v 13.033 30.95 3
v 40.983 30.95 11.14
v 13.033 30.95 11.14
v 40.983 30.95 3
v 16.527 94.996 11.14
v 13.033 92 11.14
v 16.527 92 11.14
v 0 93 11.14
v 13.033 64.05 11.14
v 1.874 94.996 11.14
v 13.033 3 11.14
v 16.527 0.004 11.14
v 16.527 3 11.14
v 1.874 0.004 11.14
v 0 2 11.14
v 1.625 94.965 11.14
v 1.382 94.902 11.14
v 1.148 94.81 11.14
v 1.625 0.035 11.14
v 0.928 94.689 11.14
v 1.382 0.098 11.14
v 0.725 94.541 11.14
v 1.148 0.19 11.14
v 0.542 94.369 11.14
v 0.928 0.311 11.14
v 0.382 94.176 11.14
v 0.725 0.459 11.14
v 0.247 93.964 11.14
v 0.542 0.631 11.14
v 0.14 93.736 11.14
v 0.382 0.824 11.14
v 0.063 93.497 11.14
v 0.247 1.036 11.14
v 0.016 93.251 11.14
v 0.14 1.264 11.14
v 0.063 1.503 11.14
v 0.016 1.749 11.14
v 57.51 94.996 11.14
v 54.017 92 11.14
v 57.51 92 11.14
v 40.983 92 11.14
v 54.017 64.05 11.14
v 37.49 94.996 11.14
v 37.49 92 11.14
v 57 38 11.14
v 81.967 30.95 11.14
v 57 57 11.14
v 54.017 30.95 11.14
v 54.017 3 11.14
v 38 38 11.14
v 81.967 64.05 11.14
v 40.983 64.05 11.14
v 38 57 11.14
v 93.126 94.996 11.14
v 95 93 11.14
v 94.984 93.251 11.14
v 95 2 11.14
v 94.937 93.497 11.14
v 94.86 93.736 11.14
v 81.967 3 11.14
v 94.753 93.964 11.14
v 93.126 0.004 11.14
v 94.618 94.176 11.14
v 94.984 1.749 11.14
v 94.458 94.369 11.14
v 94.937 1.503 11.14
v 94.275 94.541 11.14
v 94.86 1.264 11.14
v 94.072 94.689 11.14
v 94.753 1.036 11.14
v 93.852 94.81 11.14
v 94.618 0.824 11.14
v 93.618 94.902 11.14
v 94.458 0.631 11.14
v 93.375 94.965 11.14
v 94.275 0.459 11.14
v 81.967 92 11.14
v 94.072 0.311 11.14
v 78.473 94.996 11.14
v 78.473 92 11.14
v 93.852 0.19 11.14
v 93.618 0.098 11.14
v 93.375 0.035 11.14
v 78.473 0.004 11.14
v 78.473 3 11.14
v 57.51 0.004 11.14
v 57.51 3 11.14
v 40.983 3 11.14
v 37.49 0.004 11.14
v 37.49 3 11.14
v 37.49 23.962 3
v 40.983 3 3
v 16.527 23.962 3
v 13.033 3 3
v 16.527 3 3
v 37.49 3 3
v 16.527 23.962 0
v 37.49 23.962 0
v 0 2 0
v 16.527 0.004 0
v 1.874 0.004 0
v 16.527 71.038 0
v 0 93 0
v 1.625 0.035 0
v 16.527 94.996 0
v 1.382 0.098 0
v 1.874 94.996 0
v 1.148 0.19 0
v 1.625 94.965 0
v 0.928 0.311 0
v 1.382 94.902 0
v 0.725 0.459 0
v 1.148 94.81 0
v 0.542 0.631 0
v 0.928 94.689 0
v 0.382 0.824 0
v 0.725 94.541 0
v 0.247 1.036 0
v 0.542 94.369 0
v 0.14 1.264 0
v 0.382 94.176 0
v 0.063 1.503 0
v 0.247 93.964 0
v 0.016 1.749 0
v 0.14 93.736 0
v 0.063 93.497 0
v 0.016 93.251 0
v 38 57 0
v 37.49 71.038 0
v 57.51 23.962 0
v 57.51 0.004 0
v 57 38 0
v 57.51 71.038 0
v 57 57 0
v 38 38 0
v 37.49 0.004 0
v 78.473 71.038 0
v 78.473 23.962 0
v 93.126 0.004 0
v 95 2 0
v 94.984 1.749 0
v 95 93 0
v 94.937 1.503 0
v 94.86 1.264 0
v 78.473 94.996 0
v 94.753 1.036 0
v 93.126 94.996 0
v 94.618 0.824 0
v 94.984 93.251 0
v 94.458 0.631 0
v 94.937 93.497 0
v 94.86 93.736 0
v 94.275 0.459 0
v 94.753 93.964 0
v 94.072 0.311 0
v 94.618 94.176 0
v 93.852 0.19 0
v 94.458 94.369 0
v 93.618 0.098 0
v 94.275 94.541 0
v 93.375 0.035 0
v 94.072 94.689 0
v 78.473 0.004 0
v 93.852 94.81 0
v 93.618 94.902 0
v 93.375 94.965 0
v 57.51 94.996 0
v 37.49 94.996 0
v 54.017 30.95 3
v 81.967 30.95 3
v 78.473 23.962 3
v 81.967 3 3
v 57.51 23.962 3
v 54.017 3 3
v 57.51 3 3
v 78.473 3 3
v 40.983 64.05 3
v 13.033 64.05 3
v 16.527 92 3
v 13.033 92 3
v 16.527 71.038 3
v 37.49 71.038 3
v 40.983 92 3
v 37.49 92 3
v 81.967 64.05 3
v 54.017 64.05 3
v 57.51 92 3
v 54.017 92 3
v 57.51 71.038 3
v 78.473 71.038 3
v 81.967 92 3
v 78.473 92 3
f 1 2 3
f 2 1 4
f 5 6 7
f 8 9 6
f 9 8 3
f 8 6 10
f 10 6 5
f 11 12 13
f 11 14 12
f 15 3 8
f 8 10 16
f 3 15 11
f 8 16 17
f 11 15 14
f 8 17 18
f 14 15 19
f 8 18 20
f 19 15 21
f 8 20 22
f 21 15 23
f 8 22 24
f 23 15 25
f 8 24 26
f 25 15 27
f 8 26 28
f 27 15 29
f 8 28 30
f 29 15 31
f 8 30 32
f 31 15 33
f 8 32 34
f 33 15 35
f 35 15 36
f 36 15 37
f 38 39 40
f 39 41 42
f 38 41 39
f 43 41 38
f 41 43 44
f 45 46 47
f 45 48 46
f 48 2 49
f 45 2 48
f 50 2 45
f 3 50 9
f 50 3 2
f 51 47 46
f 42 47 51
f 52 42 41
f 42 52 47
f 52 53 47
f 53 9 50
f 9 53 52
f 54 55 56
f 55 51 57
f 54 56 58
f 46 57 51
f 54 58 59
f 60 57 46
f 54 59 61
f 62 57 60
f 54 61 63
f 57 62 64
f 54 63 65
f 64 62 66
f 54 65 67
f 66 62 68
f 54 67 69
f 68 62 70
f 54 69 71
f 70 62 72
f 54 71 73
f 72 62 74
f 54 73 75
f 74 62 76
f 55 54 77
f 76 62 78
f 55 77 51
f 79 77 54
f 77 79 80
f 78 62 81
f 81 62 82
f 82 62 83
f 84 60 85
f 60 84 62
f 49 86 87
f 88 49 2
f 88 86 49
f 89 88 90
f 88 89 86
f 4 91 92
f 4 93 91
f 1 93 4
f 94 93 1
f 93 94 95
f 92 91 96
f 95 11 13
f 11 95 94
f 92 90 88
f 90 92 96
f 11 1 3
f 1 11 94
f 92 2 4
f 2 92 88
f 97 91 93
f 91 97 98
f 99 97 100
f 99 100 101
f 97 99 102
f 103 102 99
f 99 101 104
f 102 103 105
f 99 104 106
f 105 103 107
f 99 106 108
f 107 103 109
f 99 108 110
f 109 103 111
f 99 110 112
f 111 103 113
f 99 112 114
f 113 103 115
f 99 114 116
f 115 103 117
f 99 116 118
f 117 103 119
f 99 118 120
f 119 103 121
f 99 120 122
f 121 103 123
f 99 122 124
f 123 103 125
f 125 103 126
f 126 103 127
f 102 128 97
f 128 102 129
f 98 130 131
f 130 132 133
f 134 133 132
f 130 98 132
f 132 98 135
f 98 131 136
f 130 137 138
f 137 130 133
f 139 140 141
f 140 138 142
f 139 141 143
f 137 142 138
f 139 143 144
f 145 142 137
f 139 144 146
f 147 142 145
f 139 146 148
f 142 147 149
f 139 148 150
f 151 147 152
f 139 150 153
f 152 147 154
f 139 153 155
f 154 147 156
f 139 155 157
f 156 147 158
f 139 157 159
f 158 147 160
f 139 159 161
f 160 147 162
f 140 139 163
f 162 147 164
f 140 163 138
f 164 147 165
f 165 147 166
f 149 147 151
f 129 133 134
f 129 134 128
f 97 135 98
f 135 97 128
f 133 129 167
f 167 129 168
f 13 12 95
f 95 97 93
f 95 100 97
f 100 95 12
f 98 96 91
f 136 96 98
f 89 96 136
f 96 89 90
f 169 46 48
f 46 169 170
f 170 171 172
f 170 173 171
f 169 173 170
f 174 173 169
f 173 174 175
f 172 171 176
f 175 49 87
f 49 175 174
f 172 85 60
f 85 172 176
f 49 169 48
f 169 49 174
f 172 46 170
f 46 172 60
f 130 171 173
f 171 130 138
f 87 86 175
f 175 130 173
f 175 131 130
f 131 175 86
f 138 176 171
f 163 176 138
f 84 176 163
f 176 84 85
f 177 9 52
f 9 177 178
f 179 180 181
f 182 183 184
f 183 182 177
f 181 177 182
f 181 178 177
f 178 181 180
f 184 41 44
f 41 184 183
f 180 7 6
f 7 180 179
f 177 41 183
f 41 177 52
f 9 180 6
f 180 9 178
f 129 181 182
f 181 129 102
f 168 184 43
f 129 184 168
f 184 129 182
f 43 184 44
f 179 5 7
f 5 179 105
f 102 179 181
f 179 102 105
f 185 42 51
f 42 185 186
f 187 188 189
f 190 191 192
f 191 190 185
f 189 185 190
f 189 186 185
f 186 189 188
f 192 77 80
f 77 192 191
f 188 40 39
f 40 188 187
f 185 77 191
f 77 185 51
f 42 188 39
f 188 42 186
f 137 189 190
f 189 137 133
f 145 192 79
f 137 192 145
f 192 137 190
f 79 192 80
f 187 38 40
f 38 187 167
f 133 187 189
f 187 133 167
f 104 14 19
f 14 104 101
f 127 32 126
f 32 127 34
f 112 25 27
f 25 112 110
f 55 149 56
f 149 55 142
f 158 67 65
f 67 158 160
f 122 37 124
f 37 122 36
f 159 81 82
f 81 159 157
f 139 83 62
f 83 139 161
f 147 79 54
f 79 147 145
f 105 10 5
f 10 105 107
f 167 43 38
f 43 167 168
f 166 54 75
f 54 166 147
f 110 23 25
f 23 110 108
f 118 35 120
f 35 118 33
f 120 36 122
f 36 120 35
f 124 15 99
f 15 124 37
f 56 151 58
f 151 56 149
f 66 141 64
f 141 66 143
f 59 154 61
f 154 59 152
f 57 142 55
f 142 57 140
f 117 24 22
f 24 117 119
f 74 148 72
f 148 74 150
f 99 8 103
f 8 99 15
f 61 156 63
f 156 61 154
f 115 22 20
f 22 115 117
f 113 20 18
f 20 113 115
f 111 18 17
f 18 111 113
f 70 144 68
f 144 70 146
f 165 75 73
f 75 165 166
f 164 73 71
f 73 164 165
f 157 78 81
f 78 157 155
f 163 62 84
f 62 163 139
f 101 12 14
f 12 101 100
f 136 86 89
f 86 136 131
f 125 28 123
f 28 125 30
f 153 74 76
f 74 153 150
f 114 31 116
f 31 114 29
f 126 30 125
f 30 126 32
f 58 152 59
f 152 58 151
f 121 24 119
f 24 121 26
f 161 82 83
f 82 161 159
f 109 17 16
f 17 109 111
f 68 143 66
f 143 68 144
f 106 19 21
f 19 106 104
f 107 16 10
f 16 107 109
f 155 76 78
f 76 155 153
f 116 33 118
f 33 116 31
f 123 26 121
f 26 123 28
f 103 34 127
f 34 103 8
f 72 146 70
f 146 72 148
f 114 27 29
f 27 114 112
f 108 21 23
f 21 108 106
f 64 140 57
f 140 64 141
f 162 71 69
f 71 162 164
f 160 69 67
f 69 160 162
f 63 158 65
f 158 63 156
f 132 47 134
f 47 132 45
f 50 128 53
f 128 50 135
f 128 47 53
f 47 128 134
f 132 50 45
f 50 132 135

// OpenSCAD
// file: SquarePileLib.scad
module LeftPile(wallThickness, totalHeight, singlePileHeight, singlePileWidth, singlePileLength, pileCount, openingSizePercent = .75){
    pileHeight = (pileCount * singlePileHeight) + .5;
    lengthOpeningSize = singlePileLength * openingSizePercent;
    widthOpeningSize = singlePileWidth * openingSizePercent;
    blockerSize = (singlePileWidth - widthOpeningSize) / 2;
    
    translate([wallThickness, wallThickness, totalHeight - pileHeight])
        cube([singlePileLength, singlePileWidth, pileHeight]);
    translate([-.00001, wallThickness + (blockerSize), 0])
        cube([wallThickness + lengthOpeningSize, widthOpeningSize, totalHeight]);
}

module RightPile(wallThickness, totalHeight, singlePileHeight, singlePileWidth, singlePileLength, pileCount, openingSizePercent = .75){
    translate([0, wallThickness + wallThickness + singlePileWidth, 0])
        rotate([0, 0, 180])
            LeftPile(wallThickness, totalHeight, singlePileHeight, singlePileWidth, singlePileLength, pileCount, openingSizePercent);
}

module BottomPile(wallThickness, totalHeight, singlePileHeight, singlePileWidth, singlePileLength, pileCount, openingSizePercent = .75){
    translate([wallThickness + wallThickness + singlePileWidth, 0, 0])
        rotate([0, 0, 90])
            LeftPile(wallThickness, totalHeight, singlePileHeight, singlePileWidth, singlePileLength, pileCount, openingSizePercent);
}

module TopPile(wallThickness, totalHeight, singlePileHeight, singlePileWidth, singlePileLength, pileCount, openingSizePercent = .75){
        rotate([0, 0, 270])
            LeftPile(wallThickness, totalHeight, singlePileHeight, singlePileWidth, singlePileLength, pileCount, openingSizePercent);
}
// file: CoreLib.scad
function whiteSpaceBetweenBoxes(side, numberOfBoxes, boxLength) =
    (side - (numberOfBoxes * boxLength)) / (numberOfBoxes + 1);
    
function getOffsetForWhiteSpace(whiteSpaceBetweenBoxes, index, boxLength, singleBoxOffset) =
    ((index + 1) * whiteSpaceBetweenBoxes + boxLength * (index)) + singleBoxOffset;
// file: EotVRecruitsLib.scad
include<SquarePileLib.scad>
singleRecruitPileHeight = 1.91;
singleRecruitPileWidth = 26.45 + 1.5;
singleRecruitPileLength = 26.45 + 1.5;

module LeftRecruitPile(wallThickness, totalHeight, recruitPileCount){
    LeftPile(
        wallThickness,
        totalHeight,
        singleRecruitPileHeight,
        singleRecruitPileWidth,
        singleRecruitPileLength,
        recruitPileCount);
}

module RightRecruitPile(wallThickness, totalHeight, recruitPileCount){
    RightPile(
        wallThickness,
        totalHeight,
        singleRecruitPileHeight,
        singleRecruitPileWidth,
        singleRecruitPileLength,
        recruitPileCount);
}

module BottomRecruitPile(wallThickness, totalHeight, recruitPileCount){
    BottomPile(
        wallThickness,
        totalHeight,
        singleRecruitPileHeight,
        singleRecruitPileWidth,
        singleRecruitPileLength,
        recruitPileCount);
}

module TopRecruitPile(wallThickness, totalHeight, recruitPileCount){
    TopPile(
        wallThickness,
        totalHeight,
        singleRecruitPileHeight,
        singleRecruitPileWidth,
        singleRecruitPileLength,
        recruitPileCount);
}

function recruitPileHeight(recruitPileCount) =
    (recruitPileCount * singleRecruitPileHeight) + .5;
// main file
include<EotVRecruitsLib.scad>
include<CoreLib.scad>
magnetHoleWidth = 19;
floorThickness = 3;
wallThickness = 3;
maxRecruitsPerStack = 4;
height = recruitPileHeight(maxRecruitsPerStack) + floorThickness;
length = 95;
width = 95;
numberOfTopBoxes = 2;
topBoxRecruitsPerStack = [4, 4, 4, 4];
numberOfBottomBoxes = 2;
bottomBoxRecruitsPerStack = [4, 4, 4, 4];
numberOfLeftBoxes = 0;
leftBoxRecruitsPerStack = [4];
numberOfRightBoxes = 0;
rightBoxRecruitsPerStack = [];

difference() {

//    whitespace between boxes = (total length - (# of boxes * width of boxes)) / (# of boxes + 1)
//    position of box n = whitespace * n + 1 + width of box * (n)
    
    $fn=50;
    minkowski()
    {
      translate([2,2,0])
        cube([length-4, width-4, height - 1]);
      cylinder(r=2,h=1);
    }
    
//    cube([length, width, height]);

    whiteSpaceBetweenTopBoxes = whiteSpaceBetweenBoxes(length, numberOfTopBoxes, singleRecruitPileWidth);
    whiteSpaceBetweenBottomBoxes = whiteSpaceBetweenBoxes(length, numberOfBottomBoxes, singleRecruitPileWidth);
    remainingWidth = width - (2 * singleRecruitPileWidth);
    whiteSpaceBetweenLeftBoxes = whiteSpaceBetweenBoxes(remainingWidth, numberOfLeftBoxes, singleRecruitPileWidth);
    whiteSpaceBetweenRightBoxes = whiteSpaceBetweenBoxes(remainingWidth, numberOfRightBoxes, singleRecruitPileWidth);

    if (numberOfBottomBoxes != 0)
    {
        for(i=[0:numberOfBottomBoxes - 1]){
            translate([
                getOffsetForWhiteSpace(whiteSpaceBetweenBottomBoxes, i, singleRecruitPileWidth, -wallThickness),
                0,
                0])
                BottomRecruitPile(wallThickness, height, bottomBoxRecruitsPerStack[i]);
        }
    }
    
    
    if (numberOfTopBoxes != 0)
    {
        for(i=[0:numberOfTopBoxes - 1]){
            translate([
                getOffsetForWhiteSpace(whiteSpaceBetweenTopBoxes, i, singleRecruitPileWidth, -wallThickness),
                width,
                0])
                TopRecruitPile(wallThickness, height, topBoxRecruitsPerStack[i]);
        }
    }
    
    if (numberOfLeftBoxes != 0)
    {
        for(i=[0:numberOfLeftBoxes - 1]){
            translate([
                0,
                getOffsetForWhiteSpace(whiteSpaceBetweenLeftBoxes, i, singleRecruitPileWidth, singleRecruitPileWidth - wallThickness),
                0])
                LeftRecruitPile(wallThickness, height, leftBoxRecruitsPerStack[i]);
        }
    }
    
    if (numberOfRightBoxes != 0)
    {
        for(i=[0:numberOfRightBoxes - 1]){
            translate([
                length,
                getOffsetForWhiteSpace(whiteSpaceBetweenRightBoxes, i, singleRecruitPileWidth, singleRecruitPileWidth - wallThickness),
                0])
                RightRecruitPile(wallThickness, height, rightBoxRecruitsPerStack[i]);
        }
    }
    
    translate([length/2 - magnetHoleWidth/2, width/2 - magnetHoleWidth/2, 0])
        cube([magnetHoleWidth, magnetHoleWidth, height]);
}
